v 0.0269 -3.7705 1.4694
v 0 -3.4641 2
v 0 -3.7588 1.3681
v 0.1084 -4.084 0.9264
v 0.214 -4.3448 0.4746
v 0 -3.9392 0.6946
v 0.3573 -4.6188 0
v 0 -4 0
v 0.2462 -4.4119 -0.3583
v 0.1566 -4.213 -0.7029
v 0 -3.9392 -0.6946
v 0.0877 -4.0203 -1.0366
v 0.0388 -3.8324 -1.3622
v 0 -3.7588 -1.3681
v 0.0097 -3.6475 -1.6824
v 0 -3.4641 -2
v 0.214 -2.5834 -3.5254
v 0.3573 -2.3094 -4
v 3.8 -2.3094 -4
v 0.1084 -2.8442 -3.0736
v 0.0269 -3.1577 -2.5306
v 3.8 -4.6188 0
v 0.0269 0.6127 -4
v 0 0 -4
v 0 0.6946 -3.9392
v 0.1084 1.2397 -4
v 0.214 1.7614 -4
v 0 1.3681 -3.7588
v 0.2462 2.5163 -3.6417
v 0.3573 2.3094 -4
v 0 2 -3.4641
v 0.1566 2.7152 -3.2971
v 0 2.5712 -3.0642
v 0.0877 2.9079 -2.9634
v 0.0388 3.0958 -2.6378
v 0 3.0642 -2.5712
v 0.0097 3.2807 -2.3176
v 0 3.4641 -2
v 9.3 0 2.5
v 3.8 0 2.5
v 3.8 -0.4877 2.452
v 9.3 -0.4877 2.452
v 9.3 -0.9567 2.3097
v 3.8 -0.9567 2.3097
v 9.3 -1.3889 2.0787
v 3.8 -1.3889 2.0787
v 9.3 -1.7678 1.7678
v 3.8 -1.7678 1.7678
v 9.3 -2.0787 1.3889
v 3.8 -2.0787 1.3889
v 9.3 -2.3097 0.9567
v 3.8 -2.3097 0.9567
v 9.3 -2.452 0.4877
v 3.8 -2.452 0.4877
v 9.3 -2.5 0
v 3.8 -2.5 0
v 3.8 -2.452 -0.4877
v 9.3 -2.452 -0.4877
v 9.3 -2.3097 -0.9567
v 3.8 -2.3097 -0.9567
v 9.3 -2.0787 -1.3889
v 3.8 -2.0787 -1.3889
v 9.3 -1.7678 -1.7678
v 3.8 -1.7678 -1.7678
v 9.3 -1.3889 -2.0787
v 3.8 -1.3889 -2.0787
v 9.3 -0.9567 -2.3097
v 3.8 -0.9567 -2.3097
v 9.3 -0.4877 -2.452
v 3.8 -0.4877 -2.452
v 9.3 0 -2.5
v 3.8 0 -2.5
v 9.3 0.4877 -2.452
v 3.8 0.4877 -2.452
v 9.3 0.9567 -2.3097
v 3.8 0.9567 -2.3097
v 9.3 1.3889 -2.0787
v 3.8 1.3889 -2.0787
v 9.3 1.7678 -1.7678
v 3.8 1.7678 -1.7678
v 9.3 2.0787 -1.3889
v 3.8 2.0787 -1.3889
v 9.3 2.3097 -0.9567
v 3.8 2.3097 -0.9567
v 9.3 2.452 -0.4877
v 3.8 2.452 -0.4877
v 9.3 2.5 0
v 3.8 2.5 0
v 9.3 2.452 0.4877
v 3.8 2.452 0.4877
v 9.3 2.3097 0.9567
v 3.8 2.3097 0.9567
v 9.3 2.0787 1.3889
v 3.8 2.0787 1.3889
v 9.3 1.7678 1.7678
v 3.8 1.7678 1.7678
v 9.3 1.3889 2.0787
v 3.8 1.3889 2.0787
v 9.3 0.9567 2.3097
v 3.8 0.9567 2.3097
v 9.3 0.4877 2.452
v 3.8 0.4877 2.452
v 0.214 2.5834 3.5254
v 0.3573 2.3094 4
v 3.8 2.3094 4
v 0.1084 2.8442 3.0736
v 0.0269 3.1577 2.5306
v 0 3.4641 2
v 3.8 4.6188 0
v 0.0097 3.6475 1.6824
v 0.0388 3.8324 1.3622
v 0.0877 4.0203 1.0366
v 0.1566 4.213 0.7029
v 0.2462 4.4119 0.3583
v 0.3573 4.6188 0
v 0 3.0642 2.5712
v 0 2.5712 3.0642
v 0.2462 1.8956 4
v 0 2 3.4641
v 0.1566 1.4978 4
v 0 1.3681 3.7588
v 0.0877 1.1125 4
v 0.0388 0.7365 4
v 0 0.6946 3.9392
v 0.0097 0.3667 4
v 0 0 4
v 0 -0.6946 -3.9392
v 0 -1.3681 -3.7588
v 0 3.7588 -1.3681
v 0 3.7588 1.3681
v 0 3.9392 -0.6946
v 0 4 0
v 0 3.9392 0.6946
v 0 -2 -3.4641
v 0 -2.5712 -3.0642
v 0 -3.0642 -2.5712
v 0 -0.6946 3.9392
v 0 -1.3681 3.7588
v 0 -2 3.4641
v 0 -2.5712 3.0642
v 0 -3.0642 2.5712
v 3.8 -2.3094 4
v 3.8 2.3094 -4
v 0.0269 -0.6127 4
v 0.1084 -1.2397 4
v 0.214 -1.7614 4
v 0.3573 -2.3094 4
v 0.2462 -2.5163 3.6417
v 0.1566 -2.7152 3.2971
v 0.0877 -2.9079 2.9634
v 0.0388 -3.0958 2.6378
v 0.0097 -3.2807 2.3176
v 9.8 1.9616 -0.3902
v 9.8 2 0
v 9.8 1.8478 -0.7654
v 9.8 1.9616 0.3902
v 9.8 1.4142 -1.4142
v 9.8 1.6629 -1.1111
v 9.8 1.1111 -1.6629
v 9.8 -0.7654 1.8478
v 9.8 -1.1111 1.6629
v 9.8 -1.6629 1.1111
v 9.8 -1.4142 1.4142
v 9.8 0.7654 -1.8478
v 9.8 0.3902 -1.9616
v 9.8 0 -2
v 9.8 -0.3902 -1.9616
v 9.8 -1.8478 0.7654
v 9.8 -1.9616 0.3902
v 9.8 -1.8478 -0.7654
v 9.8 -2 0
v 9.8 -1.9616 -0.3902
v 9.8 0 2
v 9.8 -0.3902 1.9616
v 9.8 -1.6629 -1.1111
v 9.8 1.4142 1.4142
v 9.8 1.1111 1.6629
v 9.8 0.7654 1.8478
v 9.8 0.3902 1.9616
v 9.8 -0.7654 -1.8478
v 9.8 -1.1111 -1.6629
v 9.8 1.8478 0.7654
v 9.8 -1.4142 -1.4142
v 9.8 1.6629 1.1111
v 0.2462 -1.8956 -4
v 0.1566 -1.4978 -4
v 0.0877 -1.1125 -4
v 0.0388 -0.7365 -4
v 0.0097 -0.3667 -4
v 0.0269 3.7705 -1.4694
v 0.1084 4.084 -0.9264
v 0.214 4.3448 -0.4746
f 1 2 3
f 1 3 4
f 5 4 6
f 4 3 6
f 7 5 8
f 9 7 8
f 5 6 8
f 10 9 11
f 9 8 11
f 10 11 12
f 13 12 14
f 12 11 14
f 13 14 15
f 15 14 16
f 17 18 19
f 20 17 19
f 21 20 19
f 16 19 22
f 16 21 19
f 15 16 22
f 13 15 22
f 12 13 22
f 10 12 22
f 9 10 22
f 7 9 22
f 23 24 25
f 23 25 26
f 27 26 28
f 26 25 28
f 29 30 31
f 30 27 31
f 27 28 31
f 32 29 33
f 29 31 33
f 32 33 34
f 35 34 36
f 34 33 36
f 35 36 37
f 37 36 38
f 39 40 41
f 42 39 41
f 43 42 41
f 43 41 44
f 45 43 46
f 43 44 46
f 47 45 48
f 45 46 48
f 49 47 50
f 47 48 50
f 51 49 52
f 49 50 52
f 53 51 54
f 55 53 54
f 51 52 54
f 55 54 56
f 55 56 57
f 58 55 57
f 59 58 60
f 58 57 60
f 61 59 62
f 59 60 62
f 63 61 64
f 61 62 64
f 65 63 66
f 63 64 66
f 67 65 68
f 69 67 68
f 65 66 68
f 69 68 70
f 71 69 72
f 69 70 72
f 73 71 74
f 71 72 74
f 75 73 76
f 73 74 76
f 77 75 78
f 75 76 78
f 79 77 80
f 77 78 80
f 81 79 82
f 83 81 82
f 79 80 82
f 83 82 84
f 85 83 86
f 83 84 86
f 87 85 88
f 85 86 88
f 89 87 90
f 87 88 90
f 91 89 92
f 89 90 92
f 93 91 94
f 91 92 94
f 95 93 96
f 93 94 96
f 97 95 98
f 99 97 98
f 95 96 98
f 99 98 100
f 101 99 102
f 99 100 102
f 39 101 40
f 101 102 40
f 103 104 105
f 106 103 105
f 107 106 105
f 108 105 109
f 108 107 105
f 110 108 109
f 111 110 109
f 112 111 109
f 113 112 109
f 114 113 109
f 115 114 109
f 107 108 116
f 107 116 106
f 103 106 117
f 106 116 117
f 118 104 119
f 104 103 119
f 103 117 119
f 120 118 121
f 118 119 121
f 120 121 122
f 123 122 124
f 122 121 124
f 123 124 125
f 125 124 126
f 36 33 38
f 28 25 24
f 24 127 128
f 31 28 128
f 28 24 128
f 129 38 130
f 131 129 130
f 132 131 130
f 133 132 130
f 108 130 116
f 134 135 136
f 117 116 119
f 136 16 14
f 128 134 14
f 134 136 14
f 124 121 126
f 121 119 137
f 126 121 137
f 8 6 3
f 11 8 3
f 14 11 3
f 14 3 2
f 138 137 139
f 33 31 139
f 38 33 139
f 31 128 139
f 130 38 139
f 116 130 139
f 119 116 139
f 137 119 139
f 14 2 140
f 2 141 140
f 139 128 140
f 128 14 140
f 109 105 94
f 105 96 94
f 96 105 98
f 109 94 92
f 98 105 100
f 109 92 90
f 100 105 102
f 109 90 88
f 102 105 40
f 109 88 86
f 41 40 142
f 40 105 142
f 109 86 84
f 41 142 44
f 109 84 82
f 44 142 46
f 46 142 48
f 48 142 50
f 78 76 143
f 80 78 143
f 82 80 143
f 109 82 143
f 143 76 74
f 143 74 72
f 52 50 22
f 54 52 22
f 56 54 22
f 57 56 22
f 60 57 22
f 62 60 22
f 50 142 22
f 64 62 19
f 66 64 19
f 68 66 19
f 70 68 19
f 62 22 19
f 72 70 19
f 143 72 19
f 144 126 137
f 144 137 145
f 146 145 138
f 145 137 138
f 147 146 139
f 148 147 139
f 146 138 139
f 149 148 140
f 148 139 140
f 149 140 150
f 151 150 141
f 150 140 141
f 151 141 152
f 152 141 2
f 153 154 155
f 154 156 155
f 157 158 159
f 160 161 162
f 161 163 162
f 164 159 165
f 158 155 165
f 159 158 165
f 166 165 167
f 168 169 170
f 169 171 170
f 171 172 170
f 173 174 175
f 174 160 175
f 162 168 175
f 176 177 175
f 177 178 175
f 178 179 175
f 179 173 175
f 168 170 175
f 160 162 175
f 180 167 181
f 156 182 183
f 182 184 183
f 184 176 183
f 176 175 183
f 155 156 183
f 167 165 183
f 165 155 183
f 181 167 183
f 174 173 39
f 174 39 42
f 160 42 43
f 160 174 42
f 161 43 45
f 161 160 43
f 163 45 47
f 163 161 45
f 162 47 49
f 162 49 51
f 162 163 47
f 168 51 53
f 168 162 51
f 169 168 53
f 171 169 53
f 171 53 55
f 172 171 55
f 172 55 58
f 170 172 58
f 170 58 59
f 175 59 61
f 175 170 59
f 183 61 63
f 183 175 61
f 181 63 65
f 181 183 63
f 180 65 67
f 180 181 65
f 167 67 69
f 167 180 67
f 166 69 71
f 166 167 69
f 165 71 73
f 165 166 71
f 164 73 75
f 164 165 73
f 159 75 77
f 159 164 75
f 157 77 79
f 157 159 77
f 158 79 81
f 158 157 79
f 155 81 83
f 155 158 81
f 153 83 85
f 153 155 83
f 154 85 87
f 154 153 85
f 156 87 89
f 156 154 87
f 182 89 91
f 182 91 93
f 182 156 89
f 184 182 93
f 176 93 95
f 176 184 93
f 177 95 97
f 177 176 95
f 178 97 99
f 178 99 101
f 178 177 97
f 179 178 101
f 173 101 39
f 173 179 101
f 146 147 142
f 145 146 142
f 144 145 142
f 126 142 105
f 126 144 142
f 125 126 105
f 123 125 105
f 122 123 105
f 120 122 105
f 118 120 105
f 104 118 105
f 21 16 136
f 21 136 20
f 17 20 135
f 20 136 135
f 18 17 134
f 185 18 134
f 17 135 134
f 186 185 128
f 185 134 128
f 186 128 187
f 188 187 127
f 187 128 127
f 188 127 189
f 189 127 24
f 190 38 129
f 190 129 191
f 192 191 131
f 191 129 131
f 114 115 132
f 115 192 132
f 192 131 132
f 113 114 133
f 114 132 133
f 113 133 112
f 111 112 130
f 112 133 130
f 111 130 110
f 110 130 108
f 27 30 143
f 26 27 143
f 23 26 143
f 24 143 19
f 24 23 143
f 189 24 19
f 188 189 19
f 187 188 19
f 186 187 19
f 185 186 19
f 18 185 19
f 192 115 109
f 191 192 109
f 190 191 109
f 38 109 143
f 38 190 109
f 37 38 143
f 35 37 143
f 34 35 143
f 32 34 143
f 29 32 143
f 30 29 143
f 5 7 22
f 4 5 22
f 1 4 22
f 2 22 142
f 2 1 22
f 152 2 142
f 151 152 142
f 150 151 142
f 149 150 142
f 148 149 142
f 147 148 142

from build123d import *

# Parameters (mm, degrees)
SKETCH2_R       = 4.665127021
HEX_DIE_DEPTH   = 3.8
CHANFREIN1_SIZE = 0.5


with BuildPart() as part:
    # BodySke → Base-Revolve (revolve)
    with BuildSketch(Plane.XY, mode=Mode.PRIVATE) as base_revolve_sk:
        Polygon((3.8, 2.5), (3.8, 4.618937644), (0.357343816, 4.618937644), (0, 4), (0, 0), (9.8, 0), (9.8, 2.5), align=None)
    revolve(base_revolve_sk.sketch.rotate(Axis((-25.4, 0, 0), (1, 0, 0)), 90), axis=Axis((-25.4, 0, 0), (1, 0, 0)))

    # Sketch2 → Hex-Die (cut)
    with BuildSketch(Plane(origin=(0, 0, 0), x_dir=(0, 0, -1), z_dir=(1, 0, 0))):
        Circle(SKETCH2_R)
        Polygon((-4, 2.309401087), (0, 4.618802174), (4, 2.309401087), (4, -2.309401087), (0, -4.618802174), (-4, -2.309401087), align=None, mode=Mode.SUBTRACT)
    extrude(amount=HEX_DIE_DEPTH, mode=Mode.SUBTRACT)

    # Chanfrein1
    chanfrein1_edges = [part.edges().sort_by_distance(p)[0] for p in [
        (9.8, 0, -2.5),
    ]]
    chamfer(chanfrein1_edges, length=CHANFREIN1_SIZE)


solid = part.part
